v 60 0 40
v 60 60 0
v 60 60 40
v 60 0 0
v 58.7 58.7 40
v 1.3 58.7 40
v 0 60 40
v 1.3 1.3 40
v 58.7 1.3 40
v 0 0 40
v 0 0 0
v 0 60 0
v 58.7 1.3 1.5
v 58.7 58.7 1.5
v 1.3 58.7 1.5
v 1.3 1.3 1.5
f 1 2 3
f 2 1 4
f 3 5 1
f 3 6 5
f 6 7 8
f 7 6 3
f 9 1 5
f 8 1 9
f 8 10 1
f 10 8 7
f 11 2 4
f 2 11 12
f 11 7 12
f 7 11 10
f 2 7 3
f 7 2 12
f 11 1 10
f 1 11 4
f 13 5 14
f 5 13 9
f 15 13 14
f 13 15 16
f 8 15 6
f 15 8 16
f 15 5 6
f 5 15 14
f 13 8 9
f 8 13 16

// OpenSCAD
$fn = 32;

// ----------------------------------------------------------------------
// Open box: 1.3 mm walls
// ----------------------------------------------------------------------

// --- parameters (mm) ---
box_l = 60;               // outer length, X
box_w = 60;               // outer width, Y
box_h = 40;               // outer height, Z
wall = 1.3;               // wall thickness
floor = 1.5;              // floor thickness

difference() {
  cube([box_l, box_w, box_h]);
  translate([wall, wall, floor])
    cube([box_l - 2 * wall, box_w - 2 * wall, box_h]);
}
